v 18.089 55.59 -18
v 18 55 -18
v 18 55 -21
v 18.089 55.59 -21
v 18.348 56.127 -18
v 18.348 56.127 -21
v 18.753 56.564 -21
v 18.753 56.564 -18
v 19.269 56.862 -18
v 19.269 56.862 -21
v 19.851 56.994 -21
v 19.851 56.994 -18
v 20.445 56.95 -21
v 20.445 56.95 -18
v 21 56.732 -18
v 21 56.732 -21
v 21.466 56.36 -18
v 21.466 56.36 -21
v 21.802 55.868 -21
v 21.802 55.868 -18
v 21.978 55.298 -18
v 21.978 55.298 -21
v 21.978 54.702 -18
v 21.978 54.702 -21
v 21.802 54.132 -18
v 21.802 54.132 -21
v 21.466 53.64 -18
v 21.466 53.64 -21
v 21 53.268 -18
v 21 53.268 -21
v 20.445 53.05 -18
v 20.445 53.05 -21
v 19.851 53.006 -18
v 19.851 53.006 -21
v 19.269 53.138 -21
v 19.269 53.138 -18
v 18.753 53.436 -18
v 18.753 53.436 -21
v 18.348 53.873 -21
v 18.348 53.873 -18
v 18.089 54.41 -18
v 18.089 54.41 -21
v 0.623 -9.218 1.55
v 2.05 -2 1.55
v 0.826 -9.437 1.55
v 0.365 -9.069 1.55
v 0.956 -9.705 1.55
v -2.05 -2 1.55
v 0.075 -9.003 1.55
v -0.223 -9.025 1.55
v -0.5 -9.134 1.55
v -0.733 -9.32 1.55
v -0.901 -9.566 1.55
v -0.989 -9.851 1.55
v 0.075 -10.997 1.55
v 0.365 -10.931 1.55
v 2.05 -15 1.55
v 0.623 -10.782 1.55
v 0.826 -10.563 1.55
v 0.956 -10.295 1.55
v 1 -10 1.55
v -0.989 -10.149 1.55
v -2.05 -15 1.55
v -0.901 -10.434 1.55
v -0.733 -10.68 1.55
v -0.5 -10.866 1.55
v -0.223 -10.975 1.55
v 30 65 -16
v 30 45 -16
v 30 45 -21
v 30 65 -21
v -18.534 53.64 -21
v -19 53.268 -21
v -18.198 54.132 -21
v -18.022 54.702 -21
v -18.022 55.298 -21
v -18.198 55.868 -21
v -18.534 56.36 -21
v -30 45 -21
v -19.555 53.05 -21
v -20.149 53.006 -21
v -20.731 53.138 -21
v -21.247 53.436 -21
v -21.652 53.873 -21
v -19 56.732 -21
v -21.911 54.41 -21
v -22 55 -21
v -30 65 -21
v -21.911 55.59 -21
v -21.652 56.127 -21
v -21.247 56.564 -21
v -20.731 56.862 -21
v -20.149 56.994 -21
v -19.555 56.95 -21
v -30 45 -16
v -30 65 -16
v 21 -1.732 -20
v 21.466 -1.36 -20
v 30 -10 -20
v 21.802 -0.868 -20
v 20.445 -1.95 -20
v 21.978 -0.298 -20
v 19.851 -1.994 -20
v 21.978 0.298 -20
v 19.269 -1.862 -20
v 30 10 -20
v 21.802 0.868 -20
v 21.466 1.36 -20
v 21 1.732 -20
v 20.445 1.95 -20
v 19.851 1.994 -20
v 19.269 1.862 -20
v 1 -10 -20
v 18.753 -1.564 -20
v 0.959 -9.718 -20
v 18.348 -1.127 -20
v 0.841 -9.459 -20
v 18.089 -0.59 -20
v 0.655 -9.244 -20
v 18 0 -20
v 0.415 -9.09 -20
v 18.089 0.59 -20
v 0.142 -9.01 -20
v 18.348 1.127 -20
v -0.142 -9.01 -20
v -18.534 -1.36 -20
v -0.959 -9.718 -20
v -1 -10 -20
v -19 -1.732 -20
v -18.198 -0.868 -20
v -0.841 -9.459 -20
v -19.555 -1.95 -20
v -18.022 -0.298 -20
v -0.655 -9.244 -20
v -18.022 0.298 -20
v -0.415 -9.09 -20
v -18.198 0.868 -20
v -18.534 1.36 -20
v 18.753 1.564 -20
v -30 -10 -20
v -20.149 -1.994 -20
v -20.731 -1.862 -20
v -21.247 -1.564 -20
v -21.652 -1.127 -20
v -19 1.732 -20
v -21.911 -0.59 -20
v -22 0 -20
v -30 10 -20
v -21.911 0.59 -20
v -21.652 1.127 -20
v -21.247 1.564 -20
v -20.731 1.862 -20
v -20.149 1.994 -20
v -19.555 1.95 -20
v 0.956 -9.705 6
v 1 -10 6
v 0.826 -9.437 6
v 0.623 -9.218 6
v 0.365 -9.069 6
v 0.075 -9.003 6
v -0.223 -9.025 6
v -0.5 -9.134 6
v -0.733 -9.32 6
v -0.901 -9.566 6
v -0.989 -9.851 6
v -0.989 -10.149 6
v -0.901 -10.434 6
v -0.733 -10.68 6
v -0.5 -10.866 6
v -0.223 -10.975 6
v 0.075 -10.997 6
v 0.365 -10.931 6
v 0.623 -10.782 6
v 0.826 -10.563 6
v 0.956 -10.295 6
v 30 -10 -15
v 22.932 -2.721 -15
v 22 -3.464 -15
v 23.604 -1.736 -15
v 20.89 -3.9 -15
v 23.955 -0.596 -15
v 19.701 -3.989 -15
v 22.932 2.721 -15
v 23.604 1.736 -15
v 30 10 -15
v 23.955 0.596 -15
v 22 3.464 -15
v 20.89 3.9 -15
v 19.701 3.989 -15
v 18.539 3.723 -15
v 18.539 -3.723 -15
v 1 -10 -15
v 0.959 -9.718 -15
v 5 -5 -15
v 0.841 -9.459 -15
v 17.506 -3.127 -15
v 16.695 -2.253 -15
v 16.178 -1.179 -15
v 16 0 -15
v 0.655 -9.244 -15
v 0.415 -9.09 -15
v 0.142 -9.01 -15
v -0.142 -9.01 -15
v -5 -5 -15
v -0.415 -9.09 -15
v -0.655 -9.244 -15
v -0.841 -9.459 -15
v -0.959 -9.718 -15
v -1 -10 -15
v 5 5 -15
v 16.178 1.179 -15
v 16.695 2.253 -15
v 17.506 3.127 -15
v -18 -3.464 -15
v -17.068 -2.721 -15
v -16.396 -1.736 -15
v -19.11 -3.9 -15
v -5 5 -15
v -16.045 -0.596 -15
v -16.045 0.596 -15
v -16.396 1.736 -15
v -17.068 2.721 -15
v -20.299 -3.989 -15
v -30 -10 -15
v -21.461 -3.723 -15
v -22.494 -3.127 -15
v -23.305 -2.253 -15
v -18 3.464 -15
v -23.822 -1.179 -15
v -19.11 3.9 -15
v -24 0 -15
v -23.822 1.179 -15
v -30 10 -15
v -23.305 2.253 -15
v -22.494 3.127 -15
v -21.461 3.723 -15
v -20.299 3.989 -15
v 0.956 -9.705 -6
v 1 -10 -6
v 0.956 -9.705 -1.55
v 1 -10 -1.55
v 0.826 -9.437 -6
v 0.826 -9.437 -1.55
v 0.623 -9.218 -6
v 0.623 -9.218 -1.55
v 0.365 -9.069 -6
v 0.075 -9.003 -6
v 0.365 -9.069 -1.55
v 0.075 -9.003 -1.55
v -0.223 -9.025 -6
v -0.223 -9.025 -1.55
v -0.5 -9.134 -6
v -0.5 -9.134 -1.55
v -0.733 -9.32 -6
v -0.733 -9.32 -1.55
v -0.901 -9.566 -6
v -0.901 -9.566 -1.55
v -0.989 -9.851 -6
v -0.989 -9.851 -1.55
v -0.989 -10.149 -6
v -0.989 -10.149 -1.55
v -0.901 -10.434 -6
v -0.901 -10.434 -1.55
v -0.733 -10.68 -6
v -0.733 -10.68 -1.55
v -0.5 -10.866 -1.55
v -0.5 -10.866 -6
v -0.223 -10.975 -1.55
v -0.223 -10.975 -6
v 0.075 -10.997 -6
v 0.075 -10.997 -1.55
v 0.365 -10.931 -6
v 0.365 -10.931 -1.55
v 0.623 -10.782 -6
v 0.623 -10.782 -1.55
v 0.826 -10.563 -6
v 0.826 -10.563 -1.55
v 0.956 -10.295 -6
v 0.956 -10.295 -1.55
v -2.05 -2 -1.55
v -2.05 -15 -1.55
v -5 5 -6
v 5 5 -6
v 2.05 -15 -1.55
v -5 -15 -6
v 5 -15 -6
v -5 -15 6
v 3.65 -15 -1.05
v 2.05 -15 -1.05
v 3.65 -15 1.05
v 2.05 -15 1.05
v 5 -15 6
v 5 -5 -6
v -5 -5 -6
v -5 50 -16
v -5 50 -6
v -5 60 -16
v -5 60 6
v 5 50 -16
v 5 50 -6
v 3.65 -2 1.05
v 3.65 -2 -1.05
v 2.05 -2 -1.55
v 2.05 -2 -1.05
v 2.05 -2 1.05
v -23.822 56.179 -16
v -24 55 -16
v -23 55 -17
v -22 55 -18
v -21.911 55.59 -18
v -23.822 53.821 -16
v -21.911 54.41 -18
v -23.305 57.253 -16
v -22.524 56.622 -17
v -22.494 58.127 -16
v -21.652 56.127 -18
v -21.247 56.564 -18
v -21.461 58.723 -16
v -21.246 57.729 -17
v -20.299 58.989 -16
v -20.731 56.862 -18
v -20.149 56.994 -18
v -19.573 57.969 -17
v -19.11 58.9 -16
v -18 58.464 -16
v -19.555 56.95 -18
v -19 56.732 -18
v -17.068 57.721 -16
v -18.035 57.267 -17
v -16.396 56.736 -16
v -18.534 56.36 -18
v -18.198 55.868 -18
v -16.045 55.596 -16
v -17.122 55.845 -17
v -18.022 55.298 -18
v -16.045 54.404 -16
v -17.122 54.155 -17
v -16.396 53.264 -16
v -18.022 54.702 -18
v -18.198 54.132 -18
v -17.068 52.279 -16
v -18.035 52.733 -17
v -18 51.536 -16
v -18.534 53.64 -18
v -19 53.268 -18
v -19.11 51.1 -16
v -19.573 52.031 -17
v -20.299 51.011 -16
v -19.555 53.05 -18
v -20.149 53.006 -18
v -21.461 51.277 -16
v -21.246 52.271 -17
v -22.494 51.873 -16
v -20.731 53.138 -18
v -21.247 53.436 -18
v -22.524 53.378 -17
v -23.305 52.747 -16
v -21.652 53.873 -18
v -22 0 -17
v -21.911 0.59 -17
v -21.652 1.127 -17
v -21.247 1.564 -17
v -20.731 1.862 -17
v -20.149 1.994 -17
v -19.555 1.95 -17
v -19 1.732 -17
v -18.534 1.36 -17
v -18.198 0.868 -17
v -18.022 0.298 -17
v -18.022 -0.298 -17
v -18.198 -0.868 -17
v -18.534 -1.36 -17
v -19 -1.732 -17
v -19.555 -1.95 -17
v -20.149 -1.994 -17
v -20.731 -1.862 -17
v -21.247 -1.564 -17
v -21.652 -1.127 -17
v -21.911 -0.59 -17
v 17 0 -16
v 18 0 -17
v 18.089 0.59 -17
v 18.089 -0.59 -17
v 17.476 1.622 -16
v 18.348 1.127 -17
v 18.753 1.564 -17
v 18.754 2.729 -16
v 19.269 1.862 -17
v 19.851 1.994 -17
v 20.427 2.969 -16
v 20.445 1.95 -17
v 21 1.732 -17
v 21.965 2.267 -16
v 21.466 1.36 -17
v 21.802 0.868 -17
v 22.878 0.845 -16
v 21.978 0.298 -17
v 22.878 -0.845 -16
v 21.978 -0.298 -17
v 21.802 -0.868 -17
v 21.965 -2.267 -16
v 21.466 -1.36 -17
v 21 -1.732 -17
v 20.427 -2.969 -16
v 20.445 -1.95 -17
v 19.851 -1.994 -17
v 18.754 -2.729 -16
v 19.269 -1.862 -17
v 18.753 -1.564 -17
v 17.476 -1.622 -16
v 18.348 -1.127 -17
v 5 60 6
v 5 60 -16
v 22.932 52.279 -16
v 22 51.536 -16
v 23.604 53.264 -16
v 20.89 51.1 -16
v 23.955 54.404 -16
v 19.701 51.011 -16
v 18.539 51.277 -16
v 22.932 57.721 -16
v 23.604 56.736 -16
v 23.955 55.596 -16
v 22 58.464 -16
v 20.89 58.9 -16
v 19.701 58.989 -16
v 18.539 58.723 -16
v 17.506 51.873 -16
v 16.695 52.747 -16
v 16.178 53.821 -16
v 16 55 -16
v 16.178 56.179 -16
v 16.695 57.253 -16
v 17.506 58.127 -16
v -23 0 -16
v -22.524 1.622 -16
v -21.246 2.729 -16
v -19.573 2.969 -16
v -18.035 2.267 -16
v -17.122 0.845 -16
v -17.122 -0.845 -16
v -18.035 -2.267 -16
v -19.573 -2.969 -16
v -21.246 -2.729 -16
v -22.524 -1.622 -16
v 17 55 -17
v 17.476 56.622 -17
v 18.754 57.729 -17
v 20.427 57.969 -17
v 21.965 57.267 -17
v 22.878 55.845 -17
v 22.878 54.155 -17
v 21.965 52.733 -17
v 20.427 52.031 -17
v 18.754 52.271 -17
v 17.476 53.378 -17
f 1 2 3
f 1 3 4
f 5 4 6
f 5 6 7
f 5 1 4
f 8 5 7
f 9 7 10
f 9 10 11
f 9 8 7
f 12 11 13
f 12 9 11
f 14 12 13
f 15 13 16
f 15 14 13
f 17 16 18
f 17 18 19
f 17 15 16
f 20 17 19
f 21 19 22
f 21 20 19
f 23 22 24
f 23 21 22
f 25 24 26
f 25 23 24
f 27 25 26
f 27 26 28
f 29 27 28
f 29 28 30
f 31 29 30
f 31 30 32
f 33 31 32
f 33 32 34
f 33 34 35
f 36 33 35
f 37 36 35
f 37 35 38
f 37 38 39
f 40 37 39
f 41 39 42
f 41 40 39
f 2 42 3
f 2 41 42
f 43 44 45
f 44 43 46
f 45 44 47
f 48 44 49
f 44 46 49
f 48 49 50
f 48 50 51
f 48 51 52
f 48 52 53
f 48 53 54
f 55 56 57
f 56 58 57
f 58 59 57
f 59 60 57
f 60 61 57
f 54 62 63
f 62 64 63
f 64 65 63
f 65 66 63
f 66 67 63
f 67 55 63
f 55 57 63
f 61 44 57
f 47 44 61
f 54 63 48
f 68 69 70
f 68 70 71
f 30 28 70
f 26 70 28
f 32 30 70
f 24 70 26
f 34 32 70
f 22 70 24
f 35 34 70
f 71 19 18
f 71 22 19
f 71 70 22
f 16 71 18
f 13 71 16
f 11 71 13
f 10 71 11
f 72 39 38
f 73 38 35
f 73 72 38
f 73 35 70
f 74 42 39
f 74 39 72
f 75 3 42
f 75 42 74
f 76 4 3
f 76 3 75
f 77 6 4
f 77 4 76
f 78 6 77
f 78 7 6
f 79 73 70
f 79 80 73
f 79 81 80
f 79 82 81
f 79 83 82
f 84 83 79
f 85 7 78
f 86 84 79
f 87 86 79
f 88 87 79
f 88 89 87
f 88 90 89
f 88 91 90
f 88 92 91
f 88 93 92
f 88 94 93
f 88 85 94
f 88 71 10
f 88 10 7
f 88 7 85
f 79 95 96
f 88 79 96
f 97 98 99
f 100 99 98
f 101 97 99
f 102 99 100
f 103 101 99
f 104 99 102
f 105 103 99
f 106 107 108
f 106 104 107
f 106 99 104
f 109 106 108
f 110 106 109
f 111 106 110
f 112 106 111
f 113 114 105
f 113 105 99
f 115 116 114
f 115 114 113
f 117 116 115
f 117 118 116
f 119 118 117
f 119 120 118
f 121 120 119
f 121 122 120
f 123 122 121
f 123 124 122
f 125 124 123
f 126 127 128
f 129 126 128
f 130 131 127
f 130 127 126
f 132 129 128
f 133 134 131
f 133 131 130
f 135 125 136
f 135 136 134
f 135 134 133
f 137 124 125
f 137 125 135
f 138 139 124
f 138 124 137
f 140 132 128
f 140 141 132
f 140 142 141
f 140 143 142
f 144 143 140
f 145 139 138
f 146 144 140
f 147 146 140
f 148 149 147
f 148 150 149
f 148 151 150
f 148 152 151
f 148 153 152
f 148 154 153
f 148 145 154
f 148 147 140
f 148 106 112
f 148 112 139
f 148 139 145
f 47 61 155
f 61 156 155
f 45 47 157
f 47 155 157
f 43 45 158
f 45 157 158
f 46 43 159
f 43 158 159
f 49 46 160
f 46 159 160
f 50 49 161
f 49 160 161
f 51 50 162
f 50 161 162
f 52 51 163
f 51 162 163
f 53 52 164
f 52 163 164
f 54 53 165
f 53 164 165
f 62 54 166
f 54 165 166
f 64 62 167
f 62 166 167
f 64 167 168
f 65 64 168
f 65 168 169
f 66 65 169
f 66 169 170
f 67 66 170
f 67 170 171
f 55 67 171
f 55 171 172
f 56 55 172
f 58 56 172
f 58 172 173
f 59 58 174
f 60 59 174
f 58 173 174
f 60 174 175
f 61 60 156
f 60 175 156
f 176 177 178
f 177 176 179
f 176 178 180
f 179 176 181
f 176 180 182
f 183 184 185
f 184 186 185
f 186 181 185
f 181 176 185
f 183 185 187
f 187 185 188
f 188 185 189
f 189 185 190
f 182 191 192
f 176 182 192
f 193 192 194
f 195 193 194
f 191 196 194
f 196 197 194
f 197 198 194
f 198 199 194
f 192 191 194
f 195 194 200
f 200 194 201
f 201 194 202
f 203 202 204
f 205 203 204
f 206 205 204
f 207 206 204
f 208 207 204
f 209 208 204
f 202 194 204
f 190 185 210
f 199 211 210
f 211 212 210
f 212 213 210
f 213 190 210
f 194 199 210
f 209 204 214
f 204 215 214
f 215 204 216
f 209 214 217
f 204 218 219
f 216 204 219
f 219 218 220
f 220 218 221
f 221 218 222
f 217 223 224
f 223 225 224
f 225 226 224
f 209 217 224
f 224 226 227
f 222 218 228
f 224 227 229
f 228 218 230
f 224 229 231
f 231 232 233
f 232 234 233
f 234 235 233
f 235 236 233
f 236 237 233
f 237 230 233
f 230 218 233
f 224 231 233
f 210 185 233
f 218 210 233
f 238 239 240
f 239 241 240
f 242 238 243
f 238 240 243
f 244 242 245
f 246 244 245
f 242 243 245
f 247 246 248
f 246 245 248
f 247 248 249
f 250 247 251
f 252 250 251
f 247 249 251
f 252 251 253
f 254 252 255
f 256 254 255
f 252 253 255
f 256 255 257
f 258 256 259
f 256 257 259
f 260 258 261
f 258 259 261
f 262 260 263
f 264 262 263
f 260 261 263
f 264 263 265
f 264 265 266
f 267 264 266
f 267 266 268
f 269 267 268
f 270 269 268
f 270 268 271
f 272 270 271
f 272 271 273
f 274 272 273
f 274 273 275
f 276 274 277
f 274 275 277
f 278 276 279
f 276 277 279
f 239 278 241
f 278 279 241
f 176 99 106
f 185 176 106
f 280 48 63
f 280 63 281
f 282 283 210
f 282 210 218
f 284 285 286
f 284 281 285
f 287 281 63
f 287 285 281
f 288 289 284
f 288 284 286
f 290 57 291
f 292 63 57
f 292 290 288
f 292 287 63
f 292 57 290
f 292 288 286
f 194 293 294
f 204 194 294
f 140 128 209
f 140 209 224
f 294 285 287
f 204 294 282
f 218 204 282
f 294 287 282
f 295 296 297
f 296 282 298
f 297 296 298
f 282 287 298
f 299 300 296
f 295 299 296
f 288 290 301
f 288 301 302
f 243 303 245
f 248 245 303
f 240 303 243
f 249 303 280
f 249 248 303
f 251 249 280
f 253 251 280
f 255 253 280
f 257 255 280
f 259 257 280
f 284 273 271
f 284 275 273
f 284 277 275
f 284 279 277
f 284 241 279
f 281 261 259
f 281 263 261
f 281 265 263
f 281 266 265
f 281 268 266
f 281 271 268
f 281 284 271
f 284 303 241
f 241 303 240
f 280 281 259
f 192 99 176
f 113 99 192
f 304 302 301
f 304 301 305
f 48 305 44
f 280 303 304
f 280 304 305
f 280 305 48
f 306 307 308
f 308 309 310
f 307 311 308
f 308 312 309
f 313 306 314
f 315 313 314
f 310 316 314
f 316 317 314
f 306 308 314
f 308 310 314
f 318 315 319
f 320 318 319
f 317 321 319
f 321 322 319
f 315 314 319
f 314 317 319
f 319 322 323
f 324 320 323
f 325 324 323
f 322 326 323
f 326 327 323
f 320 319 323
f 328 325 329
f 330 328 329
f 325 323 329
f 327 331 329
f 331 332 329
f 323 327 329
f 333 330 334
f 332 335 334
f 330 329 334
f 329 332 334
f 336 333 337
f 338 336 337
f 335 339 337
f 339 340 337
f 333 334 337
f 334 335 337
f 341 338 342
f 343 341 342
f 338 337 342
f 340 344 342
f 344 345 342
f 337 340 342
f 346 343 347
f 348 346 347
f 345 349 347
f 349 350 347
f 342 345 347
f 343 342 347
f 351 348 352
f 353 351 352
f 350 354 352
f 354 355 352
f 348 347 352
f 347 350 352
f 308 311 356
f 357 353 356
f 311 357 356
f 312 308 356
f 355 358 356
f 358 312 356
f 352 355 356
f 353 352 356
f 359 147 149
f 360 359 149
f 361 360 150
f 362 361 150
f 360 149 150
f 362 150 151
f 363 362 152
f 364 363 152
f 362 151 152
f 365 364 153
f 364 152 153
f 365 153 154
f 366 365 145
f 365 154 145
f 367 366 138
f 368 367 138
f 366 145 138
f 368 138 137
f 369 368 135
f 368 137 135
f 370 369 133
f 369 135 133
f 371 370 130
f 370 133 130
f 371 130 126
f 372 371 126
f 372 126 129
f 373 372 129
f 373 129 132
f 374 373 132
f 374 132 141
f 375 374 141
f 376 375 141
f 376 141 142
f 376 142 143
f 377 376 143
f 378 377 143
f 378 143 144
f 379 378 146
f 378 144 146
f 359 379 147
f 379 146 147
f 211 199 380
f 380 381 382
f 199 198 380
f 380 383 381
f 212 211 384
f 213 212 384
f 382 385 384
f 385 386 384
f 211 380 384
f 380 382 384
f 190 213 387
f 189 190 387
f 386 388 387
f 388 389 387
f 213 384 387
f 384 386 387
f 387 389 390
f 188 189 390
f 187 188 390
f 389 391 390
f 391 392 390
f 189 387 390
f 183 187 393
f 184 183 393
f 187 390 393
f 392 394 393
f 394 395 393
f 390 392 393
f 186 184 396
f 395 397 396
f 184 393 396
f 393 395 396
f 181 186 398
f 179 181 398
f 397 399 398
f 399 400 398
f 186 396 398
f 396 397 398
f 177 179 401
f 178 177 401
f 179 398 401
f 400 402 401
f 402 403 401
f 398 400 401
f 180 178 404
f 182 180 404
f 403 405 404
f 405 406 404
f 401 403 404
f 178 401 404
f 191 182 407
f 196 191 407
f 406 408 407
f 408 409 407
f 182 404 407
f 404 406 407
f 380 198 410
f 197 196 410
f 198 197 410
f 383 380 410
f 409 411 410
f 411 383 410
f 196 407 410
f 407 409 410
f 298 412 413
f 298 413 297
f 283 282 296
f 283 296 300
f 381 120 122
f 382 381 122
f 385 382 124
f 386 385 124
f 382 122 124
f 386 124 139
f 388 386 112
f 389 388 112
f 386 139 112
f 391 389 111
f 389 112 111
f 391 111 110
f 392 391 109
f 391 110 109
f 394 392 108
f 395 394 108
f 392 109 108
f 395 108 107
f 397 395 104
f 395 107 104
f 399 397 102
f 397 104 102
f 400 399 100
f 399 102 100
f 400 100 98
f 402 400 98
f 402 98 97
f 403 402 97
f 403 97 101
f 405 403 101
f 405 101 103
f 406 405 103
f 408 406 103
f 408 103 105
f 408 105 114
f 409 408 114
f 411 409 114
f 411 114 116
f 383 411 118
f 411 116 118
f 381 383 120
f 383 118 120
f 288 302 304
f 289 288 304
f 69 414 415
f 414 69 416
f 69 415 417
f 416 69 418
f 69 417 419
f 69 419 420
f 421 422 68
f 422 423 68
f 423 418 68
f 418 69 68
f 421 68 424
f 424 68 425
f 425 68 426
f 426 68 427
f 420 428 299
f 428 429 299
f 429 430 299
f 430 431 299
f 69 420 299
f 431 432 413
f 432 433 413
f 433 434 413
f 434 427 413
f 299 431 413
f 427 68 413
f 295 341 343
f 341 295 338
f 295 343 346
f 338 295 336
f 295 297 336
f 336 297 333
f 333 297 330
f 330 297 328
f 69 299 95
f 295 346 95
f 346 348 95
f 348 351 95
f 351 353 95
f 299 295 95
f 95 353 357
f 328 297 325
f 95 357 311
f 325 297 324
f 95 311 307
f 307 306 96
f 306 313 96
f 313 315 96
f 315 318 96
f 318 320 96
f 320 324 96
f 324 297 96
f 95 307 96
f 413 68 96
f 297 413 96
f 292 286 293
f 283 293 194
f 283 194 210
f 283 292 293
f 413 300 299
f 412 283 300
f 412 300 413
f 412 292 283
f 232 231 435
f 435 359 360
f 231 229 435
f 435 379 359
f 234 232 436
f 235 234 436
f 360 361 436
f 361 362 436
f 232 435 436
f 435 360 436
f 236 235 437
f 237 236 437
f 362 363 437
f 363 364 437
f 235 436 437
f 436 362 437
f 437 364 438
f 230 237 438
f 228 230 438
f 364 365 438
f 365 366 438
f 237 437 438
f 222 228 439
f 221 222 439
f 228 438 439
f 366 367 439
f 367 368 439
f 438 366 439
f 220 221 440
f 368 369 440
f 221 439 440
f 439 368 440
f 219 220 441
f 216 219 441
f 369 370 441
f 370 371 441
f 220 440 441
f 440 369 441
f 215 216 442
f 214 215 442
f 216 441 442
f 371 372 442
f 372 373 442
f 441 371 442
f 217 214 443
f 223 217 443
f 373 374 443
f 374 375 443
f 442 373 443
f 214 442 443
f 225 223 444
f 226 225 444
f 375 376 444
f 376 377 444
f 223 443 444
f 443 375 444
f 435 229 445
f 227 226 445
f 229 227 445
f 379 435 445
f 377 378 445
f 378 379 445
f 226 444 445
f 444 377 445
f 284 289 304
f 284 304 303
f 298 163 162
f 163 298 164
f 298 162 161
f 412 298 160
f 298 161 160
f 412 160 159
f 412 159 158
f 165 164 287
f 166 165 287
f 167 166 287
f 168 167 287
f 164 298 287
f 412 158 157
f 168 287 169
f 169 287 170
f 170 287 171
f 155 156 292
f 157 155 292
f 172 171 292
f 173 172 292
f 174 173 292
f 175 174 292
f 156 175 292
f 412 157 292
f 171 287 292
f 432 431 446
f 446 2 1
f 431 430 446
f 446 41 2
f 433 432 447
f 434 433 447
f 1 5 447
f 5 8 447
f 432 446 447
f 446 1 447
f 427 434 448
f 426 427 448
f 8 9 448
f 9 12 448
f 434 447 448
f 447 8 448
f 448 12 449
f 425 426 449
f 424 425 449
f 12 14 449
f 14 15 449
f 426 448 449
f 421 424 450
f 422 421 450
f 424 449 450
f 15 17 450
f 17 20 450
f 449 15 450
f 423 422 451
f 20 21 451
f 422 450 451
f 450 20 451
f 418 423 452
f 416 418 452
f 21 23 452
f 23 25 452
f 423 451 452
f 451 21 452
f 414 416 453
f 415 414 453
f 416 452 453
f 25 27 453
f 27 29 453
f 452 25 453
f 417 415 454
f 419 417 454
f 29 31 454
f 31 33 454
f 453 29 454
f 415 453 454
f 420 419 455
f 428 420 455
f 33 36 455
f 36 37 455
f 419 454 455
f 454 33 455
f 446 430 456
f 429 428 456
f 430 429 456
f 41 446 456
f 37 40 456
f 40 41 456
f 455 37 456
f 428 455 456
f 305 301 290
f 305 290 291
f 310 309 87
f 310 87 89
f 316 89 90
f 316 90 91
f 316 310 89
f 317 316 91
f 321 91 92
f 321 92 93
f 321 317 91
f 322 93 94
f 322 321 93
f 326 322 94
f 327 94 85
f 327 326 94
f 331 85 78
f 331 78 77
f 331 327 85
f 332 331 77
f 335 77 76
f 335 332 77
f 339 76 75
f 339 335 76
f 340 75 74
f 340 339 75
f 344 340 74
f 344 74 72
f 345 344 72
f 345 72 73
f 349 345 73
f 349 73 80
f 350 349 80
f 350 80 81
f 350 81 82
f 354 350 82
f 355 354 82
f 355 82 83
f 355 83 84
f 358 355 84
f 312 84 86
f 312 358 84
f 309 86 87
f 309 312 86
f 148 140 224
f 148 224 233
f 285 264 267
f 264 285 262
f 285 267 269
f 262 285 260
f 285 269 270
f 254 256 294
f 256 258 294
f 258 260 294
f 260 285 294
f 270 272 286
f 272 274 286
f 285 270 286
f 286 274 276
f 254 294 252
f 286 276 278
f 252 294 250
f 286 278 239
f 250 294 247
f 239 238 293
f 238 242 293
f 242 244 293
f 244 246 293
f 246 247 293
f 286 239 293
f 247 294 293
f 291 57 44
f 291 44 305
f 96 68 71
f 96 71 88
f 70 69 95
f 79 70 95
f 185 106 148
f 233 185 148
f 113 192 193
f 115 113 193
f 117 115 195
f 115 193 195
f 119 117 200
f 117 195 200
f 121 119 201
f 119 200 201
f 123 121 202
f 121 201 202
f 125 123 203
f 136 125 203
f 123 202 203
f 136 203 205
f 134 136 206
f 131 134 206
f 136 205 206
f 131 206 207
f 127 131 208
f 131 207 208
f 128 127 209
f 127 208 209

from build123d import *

# Parameters (mm, degrees)
SKETCH1_W                = 10
SKETCH1_H                = 10
BOSS_EXTRUDE1_DEPTH      = 5
SKETCH2_W                = 10
SKETCH2_H                = 10
BOSS_EXTRUDE2_DEPTH      = 20
SKETCH3_W                = 60
SKETCH3_H                = 20
SKETCH3_R                = 2
BOSS_EXTRUDE3_DEPTH      = 5
SKETCH4_W                = 10
SKETCH4_H                = 12
BOSS_EXTRUDE4_DEPTH      = 10
BOSS_EXTRUDE4_DEPTH_BACK = 65
SKETCH5_W                = 4.1
SKETCH5_H                = 3.1
SKETCH5_W_2              = 1.6
SKETCH5_H_2              = 2.1
CUT_EXTRUDE1_DEPTH       = 13
SKETCH7_R                = 1
CUT_EXTRUDE3_DEPTH       = 27
SKETCH10_W               = 10
SKETCH10_H               = 10
BOSS_EXTRUDE6_DEPTH      = 10
SKETCH12_W               = 60
SKETCH12_H               = 20
SKETCH12_R               = 2
BOSS_EXTRUDE7_DEPTH      = 5
CHAMFER1_SIZE            = 2


with BuildPart() as part:
    # Sketch1 → Boss-Extrude1 (new body)
    with BuildSketch(Plane.XY):
        Rectangle(SKETCH1_W, SKETCH1_H)
    extrude(amount=BOSS_EXTRUDE1_DEPTH)

    # Sketch2 → Boss-Extrude2 (add)
    with BuildSketch(Plane(origin=(0, 0, 0), x_dir=(-1, 0, 0), z_dir=(0, 0, -1))):
        Rectangle(SKETCH2_W, SKETCH2_H)
    extrude(amount=BOSS_EXTRUDE2_DEPTH)

    # Sketch3 → Boss-Extrude3 (add)
    with BuildSketch(Plane(origin=(0, 0, -20), x_dir=(-1, 0, 0), z_dir=(0, 0, -1))):
        Rectangle(SKETCH3_W, SKETCH3_H)
        with Locations((20, 0)):
            Circle(SKETCH3_R, mode=Mode.SUBTRACT)
        with Locations((-20, 0)):
            Circle(SKETCH3_R, mode=Mode.SUBTRACT)
    extrude(amount=-BOSS_EXTRUDE3_DEPTH)

    # Sketch4 → Boss-Extrude4 (add, two sides)
    with BuildSketch(Plane.XZ.offset(5)) as boss_extrude4_sk:
        Rectangle(SKETCH4_W, SKETCH4_H)
    extrude(amount=BOSS_EXTRUDE4_DEPTH)
    extrude(boss_extrude4_sk.sketch, amount=-BOSS_EXTRUDE4_DEPTH_BACK)

    # Sketch5 → Cut-Extrude1 (cut)
    with BuildSketch(Plane(origin=(0, -15, 0), x_dir=(-1, 0, 0), z_dir=(0, -1, 0))):
        Rectangle(SKETCH5_W, SKETCH5_H)
        with Locations((-2.85, 0)):
            Rectangle(SKETCH5_W_2, SKETCH5_H_2)
    extrude(amount=-CUT_EXTRUDE1_DEPTH, mode=Mode.SUBTRACT)

    # Sketch7 → Cut-Extrude3 (cut, through all)
    with BuildSketch(Plane.XY.offset(6)):
        with Locations((0, -10)):
            Circle(SKETCH7_R)
    extrude(amount=-CUT_EXTRUDE3_DEPTH, mode=Mode.SUBTRACT)

    # Sketch10 → Boss-Extrude6 (add)
    with BuildSketch(Plane(origin=(0, 0, -6), x_dir=(-1, 0, 0), z_dir=(0, 0, -1))):
        with Locations((0, 55)):
            Rectangle(SKETCH10_W, SKETCH10_H)
    extrude(amount=BOSS_EXTRUDE6_DEPTH)

    # Sketch12 → Boss-Extrude7 (add)
    with BuildSketch(Plane(origin=(0, 0, -16), x_dir=(-1, 0, 0), z_dir=(0, 0, -1))):
        with Locations((0, 55)):
            Rectangle(SKETCH12_W, SKETCH12_H)
        with Locations((20, 55)):
            Circle(SKETCH12_R, mode=Mode.SUBTRACT)
        with Locations((-20, 55)):
            Circle(SKETCH12_R, mode=Mode.SUBTRACT)
    extrude(amount=BOSS_EXTRUDE7_DEPTH)

    # Chamfer1
    chamfer1_edges = [part.edges().sort_by_distance(p)[0] for p in [
        (-18, 55, -16),
        (22, 55, -16),
        (-18, 0, -15),
        (22, 0, -15),
    ]]
    chamfer(chamfer1_edges, length=CHAMFER1_SIZE)


solid = part.part
